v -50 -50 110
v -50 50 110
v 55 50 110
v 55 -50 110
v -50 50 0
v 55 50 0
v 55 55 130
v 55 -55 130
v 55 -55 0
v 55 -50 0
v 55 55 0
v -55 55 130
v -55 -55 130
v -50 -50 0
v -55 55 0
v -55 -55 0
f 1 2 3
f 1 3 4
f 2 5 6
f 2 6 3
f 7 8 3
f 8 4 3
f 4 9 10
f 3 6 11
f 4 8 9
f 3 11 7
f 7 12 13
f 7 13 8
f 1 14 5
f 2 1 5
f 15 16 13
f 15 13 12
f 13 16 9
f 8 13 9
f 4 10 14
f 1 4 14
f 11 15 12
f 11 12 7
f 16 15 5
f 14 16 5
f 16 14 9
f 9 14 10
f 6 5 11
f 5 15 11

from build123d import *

# Parameters (mm, degrees)
SKETCH_1_W               = 110
SKETCH_1_H               = 110
EXTRUDE_1_DEPTH          = 130
SKETCH_2_W               = 100
SKETCH_2_H               = 100
CUT_EXTRUDE_1_DEPTH      = 110
CUT_EXTRUDE_2_DEPTH      = 179.955301682
CUT_EXTRUDE_2_DEPTH_BACK = 10


with BuildPart() as part:
    # 草图1 → 凸台-拉伸1 (new body)
    with BuildSketch(Plane.XY):
        Rectangle(SKETCH_1_W, SKETCH_1_H)
    extrude(amount=EXTRUDE_1_DEPTH)

    # 草图2 → 切除-拉伸1 (cut)
    with BuildSketch(Plane(origin=(0, 0, 0), x_dir=(-1, 0, 0), z_dir=(0, 0, -1))):
        Rectangle(SKETCH_2_W, SKETCH_2_H)
    extrude(amount=-CUT_EXTRUDE_1_DEPTH, mode=Mode.SUBTRACT)

    # 草图3 → 切除-拉伸2 (cut, two sides: drawn at the far end of the back side and taken through both)
    with BuildSketch(Plane(origin=(55, 0, 0), x_dir=(0, 0, -1), z_dir=(1, 0, 0)).offset(-CUT_EXTRUDE_2_DEPTH_BACK)):
        Polygon((344.215499341, 50), (0, 50), (-110, 50), (-110, -50), (0, -50), (344.215499341, -50), (1032.646498024, -50), (1032.646498024, 50), align=None)
    extrude(amount=CUT_EXTRUDE_2_DEPTH + CUT_EXTRUDE_2_DEPTH_BACK, mode=Mode.SUBTRACT)


solid = part.part
